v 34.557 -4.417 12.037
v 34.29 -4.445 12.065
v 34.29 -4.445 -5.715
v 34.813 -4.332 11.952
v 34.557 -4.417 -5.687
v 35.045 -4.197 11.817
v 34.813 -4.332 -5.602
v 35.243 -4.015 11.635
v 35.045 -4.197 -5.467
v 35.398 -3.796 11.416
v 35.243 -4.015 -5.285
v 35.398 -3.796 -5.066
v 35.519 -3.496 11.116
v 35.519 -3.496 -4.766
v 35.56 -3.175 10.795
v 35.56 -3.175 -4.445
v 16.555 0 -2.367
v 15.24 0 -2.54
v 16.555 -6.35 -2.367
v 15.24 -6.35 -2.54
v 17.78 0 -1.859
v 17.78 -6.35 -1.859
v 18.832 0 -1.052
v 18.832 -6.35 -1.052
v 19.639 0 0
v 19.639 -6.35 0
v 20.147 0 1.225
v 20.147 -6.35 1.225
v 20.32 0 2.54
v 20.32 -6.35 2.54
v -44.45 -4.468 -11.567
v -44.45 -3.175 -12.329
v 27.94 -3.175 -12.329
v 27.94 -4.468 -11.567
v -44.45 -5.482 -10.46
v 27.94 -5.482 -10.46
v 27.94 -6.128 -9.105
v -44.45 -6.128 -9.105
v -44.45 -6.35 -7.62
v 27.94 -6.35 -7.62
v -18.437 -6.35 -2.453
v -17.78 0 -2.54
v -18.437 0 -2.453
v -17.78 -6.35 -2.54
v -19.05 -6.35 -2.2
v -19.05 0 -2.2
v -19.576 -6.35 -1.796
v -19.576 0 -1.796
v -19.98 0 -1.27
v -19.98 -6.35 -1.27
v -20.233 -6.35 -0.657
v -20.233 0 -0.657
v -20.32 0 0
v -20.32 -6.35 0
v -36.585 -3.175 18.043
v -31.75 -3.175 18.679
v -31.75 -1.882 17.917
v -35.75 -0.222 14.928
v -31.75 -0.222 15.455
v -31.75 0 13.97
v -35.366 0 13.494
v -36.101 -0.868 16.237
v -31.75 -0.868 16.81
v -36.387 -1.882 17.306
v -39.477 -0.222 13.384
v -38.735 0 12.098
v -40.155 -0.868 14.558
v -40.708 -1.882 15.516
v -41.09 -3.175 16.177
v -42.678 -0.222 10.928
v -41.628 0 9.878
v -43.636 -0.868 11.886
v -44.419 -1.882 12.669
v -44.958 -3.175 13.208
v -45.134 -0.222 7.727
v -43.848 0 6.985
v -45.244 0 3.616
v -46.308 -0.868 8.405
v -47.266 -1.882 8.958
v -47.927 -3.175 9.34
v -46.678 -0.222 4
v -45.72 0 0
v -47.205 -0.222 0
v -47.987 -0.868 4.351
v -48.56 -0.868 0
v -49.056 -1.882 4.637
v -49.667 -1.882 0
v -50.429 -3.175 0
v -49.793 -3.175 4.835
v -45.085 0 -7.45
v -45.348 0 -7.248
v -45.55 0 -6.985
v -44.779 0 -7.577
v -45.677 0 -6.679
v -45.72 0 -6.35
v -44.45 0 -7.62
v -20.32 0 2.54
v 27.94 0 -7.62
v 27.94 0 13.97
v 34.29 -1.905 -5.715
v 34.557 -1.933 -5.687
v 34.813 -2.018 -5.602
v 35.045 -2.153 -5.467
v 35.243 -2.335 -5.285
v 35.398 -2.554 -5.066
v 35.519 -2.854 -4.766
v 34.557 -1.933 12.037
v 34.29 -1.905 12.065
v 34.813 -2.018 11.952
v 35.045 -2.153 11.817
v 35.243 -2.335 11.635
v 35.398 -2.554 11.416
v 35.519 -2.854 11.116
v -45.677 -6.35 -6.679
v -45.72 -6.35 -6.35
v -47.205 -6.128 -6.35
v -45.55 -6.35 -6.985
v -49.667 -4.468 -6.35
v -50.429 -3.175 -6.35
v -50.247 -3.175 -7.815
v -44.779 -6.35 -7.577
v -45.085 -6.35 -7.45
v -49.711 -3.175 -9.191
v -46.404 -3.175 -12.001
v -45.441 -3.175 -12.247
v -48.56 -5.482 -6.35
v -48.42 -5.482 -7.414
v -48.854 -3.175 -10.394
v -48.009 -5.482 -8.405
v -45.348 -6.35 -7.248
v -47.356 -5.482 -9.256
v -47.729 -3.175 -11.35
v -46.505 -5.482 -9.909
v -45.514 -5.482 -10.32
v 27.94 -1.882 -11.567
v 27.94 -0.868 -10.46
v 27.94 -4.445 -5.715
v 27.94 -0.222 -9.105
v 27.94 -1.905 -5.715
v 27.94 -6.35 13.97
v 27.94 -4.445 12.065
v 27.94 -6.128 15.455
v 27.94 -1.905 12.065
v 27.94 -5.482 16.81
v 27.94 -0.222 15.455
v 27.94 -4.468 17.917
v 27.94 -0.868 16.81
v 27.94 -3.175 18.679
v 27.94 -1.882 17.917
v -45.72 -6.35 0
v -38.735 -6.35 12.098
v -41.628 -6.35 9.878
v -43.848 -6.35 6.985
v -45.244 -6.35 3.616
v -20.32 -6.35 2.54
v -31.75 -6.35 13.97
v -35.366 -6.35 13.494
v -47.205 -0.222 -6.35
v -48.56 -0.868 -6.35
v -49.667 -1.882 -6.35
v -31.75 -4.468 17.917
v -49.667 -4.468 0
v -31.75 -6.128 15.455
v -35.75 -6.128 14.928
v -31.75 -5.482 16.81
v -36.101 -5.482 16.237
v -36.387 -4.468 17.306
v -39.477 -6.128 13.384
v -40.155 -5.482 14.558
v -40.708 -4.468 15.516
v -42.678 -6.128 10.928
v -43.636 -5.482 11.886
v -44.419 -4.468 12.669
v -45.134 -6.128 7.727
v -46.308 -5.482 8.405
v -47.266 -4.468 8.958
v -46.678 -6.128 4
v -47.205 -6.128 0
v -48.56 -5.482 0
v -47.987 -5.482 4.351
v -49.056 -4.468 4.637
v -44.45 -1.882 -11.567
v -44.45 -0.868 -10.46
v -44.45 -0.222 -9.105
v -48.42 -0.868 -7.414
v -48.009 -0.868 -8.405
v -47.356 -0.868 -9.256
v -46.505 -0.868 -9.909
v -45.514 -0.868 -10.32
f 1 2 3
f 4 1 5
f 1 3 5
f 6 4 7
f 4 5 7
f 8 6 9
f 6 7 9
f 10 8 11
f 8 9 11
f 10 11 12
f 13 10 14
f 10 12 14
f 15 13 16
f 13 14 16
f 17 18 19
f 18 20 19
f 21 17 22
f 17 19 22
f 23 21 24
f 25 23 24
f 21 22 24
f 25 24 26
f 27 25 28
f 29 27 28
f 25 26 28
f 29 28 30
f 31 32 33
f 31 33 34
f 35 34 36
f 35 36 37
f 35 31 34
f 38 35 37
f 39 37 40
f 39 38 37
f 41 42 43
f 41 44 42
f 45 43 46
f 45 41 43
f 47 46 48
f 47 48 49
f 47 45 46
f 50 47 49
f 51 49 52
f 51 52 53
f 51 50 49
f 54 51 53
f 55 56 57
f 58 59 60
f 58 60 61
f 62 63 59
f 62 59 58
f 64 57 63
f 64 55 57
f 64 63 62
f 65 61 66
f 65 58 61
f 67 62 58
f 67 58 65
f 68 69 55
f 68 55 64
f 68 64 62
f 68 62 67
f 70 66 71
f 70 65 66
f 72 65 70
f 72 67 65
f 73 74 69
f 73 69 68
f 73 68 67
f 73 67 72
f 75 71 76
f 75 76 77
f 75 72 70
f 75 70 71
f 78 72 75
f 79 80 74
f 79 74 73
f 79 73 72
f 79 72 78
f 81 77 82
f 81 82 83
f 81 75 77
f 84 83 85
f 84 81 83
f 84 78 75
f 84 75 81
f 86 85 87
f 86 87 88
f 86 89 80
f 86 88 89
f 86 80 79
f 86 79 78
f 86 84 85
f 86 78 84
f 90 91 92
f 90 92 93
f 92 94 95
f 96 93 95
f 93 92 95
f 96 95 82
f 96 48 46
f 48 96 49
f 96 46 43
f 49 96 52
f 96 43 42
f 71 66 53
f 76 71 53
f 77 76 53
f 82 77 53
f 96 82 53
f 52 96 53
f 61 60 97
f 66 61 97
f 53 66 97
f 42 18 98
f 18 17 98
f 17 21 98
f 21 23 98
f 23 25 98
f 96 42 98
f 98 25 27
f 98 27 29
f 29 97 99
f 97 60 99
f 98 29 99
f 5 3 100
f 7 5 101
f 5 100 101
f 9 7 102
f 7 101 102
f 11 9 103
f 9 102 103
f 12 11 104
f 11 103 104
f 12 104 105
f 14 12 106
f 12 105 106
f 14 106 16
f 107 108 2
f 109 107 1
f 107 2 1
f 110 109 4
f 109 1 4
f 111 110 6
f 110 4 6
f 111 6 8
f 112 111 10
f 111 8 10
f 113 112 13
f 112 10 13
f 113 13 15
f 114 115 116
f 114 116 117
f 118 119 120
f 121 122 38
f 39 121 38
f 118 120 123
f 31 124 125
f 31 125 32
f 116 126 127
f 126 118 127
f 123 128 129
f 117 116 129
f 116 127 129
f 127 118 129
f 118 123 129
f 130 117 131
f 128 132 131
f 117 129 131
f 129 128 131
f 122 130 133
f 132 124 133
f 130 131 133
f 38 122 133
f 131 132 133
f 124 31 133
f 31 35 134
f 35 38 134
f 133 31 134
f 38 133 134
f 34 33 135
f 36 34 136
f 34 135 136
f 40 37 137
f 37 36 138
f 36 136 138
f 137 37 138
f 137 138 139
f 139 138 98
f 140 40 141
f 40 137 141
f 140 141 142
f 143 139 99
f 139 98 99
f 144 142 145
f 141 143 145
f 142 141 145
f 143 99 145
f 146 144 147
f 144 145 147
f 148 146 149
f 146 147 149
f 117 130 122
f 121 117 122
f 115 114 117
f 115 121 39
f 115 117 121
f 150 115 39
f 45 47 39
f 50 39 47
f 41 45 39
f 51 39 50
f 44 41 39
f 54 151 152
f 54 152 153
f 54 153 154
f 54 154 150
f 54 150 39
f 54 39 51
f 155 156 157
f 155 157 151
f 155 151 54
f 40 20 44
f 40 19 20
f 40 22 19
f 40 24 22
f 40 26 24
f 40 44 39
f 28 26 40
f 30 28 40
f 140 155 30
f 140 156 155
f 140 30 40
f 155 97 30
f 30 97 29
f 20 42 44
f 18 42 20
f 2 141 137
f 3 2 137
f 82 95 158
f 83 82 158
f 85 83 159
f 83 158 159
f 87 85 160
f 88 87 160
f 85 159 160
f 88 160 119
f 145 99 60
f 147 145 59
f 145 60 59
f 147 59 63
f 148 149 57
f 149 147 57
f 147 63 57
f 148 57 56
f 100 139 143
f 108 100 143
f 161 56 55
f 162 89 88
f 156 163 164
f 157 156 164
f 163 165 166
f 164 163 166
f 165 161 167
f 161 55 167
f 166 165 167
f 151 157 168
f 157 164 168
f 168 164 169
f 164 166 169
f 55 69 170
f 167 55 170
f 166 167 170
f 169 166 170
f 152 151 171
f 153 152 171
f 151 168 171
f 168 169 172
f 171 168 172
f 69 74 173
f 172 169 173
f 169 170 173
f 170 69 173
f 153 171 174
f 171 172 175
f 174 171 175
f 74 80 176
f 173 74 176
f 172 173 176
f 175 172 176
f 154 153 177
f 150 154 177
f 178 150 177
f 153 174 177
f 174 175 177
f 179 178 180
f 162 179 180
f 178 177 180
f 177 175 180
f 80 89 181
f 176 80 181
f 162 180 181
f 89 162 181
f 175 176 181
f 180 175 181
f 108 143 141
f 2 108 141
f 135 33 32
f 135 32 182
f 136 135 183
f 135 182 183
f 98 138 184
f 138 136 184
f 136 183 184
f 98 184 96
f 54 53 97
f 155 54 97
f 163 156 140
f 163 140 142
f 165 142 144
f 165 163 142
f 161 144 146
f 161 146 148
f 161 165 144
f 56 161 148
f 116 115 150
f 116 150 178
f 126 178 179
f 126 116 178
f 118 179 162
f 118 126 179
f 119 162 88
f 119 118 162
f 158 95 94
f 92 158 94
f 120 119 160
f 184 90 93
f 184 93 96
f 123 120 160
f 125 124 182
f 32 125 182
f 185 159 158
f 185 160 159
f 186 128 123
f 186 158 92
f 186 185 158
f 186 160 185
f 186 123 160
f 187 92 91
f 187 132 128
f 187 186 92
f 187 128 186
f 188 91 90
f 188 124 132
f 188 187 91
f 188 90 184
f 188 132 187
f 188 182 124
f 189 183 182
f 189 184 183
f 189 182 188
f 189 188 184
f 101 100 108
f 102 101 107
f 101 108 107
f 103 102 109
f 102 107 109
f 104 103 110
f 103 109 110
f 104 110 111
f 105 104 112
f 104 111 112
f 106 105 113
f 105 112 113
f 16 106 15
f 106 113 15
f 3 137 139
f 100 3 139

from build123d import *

# Parameters (mm, degrees)
F0_W         = 40.64
F0_H         = 5.08
F1_DEPTH     = 6.35
F3_DEPTH     = 7.62
F4_R         = 1.26999
F5_T1_DEPTH  = 6.35
F5_T3_DEPTH  = 85.09
F5_T5_DEPTH  = 72.39
F5_T8_ANGLE  = 90
F5_T10_ANGLE = 90
F5_T12_ANGLE = 90
F5_T14_ANGLE = 90
F6_R         = 5.07999
F7_R         = 2.54


# Not quite as in the source:
# - a fillet or chamfer that OpenCascade refuses, or shapes differently, is made with other operations: its cross-section is extruded or revolved along the edge and cut away or added
# - a fillet or chamfer is up to 0.001 mm smaller than in the source, because OpenCascade refuses the exact size


with BuildPart() as f1:
    # F0 (on Front) → F1 (new body)
    with BuildSketch(Plane.XZ):
        with BuildLine():
            ThreePointArc((-31.75, 19.05), (-45.2203841816, 13.4703841816), (-50.8, 0))
            Line((-50.8, 0), (-50.8, -6.35))
            ThreePointArc((-50.8, -6.35), (-48.9401280605, -10.8401280605), (-44.45, -12.7))
            Line((-44.45, -12.7), (27.94, -12.7))
            Line((27.94, -12.7), (27.94, 19.05))
            Line((27.94, 19.05), (20.32, 19.05))
            Line((20.32, 19.05), (-31.75, 19.05))
        make_face()
        Rectangle(F0_W, F0_H, mode=Mode.SUBTRACT)
    extrude(amount=F1_DEPTH)

    # F2 (on face) → F3 (join)
    with BuildSketch(Plane.YZ.offset(27.94)):
        Polygon((-4.445, -5.715), (-3.175, -5.715), (-1.905, -5.715), (-1.905, 12.065), (-4.445, 12.065), align=None)
    extrude(amount=F3_DEPTH)

    # F4 (radius 1.27 in the source; OpenCascade refuses exactly that, so slightly less here)
    f4_edges = [f1.edges().sort_by_distance(p)[0] for p in [
        (35.56, -4.445, 3.175),
        (35.56, -3.175, 12.065),
        (35.56, -1.905, 3.175),
        (35.56, -3.175, -5.715),
    ]]
    fillet(f4_edges, radius=F4_R)

    # F5: fillet of radius 5.08 on 2 edges, made by hand

    # F5_s2 → F5_t1 (cut)
    with BuildSketch(Plane.XY.offset(-6.35)):
        with BuildLine():
            ThreePointArc((-45.72, 0), (-49.3121024484, -1.4878975516), (-50.8, -5.08))
            Line((-50.8, -5.08), (-50.8, 0))
            Line((-50.8, 0), (-45.72, 0))
        make_face()
        with BuildLine():
            ThreePointArc((-45.72, -6.35), (-49.3121024484, -4.8621024484), (-50.8, -1.27))
            Line((-50.8, -1.27), (-50.8, -6.35))
            Line((-50.8, -6.35), (-45.72, -6.35))
        make_face()
    extrude(amount=F5_T1_DEPTH, mode=Mode.SUBTRACT)

    # F5_s4 → F5_t3 (cut)
    with BuildSketch(Plane.YZ.offset(-44.45)):
        with BuildLine():
            ThreePointArc((-5.08, -12.7), (-1.4878975516, -11.2121024484), (0, -7.62))
            Line((0, -7.62), (0, -12.7))
            Line((0, -12.7), (-5.08, -12.7))
        make_face()
        with BuildLine():
            ThreePointArc((-1.27, -12.7), (-4.8621024484, -11.2121024484), (-6.35, -7.62))
            Line((-6.35, -7.62), (-6.35, -12.7))
            Line((-6.35, -12.7), (-1.27, -12.7))
        make_face()
    extrude(amount=F5_T3_DEPTH, mode=Mode.SUBTRACT)

    # F5_s6 → F5_t5 (cut)
    with BuildSketch(Plane.YZ.offset(-31.75)):
        with BuildLine():
            ThreePointArc((0, 13.97), (-1.4878975516, 17.5621024484), (-5.08, 19.05))
            Line((-5.08, 19.05), (0, 19.05))
            Line((0, 19.05), (0, 13.97))
        make_face()
        with BuildLine():
            ThreePointArc((-6.35, 13.97), (-4.8621024484, 17.5621024484), (-1.27, 19.05))
            Line((-1.27, 19.05), (-6.35, 19.05))
            Line((-6.35, 19.05), (-6.35, 13.97))
        make_face()
    extrude(amount=F5_T5_DEPTH, mode=Mode.SUBTRACT)

    # F5_s7 → F5_t8 (revolve, cut)
    with BuildSketch(Plane.XY.offset(-6.35)):
        with BuildLine():
            ThreePointArc((-45.72, -6.35), (-49.3121024484, -4.8621024484), (-50.8, -1.27))
            Line((-50.8, -1.27), (-50.8, -6.35))
            Line((-50.8, -6.35), (-45.72, -6.35))
        make_face()
    revolve(axis=Axis((-44.45, -6.35, -6.35), (0, -1, 0)), revolution_arc=F5_T8_ANGLE, mode=Mode.SUBTRACT)

    # F5_s9 → F5_t10 (revolve, cut)
    with BuildSketch(Plane.YZ.offset(-31.75)):
        with BuildLine():
            ThreePointArc((0, 13.97), (-1.4878975516, 17.5621024484), (-5.08, 19.05))
            Line((-5.08, 19.05), (0, 19.05))
            Line((0, 19.05), (0, 13.97))
        make_face()
    revolve(axis=Axis((-31.75, 0, 0), (0, -1, 0)), revolution_arc=F5_T10_ANGLE, mode=Mode.SUBTRACT)

    # F5_s11 → F5_t12 (revolve, cut)
    with BuildSketch(Plane.XY.offset(-6.35)):
        with BuildLine():
            ThreePointArc((-45.72, 0), (-49.3121024484, -1.4878975516), (-50.8, -5.08))
            Line((-50.8, -5.08), (-50.8, 0))
            Line((-50.8, 0), (-45.72, 0))
        make_face()
    revolve(axis=Axis((-44.45, 0, -6.35), (0, -1, 0)), revolution_arc=F5_T12_ANGLE, mode=Mode.SUBTRACT)

    # F5_s13 → F5_t14 (revolve, cut)
    with BuildSketch(Plane.YZ.offset(-31.75)):
        with BuildLine():
            ThreePointArc((-6.35, 13.97), (-4.8621024484, 17.5621024484), (-1.27, 19.05))
            Line((-1.27, 19.05), (-6.35, 19.05))
            Line((-6.35, 19.05), (-6.35, 13.97))
        make_face()
    revolve(axis=Axis((-31.75, -6.35, 0), (0, -1, 0)), revolution_arc=F5_T14_ANGLE, mode=Mode.SUBTRACT)

    # F6 (radius 5.08 in the source; OpenCascade refuses exactly that, so slightly less here)
    f6_edges = [f1.edges().sort_by_distance(p)[0] for p in [
        (20.32, -3.175, -2.54),
    ]]
    fillet(f6_edges, radius=F6_R)

    # F7
    f7_edges = [f1.edges().sort_by_distance(p)[0] for p in [
        (-20.32, -3.175, -2.54),
    ]]
    fillet(f7_edges, radius=F7_R)


solid = f1.part
